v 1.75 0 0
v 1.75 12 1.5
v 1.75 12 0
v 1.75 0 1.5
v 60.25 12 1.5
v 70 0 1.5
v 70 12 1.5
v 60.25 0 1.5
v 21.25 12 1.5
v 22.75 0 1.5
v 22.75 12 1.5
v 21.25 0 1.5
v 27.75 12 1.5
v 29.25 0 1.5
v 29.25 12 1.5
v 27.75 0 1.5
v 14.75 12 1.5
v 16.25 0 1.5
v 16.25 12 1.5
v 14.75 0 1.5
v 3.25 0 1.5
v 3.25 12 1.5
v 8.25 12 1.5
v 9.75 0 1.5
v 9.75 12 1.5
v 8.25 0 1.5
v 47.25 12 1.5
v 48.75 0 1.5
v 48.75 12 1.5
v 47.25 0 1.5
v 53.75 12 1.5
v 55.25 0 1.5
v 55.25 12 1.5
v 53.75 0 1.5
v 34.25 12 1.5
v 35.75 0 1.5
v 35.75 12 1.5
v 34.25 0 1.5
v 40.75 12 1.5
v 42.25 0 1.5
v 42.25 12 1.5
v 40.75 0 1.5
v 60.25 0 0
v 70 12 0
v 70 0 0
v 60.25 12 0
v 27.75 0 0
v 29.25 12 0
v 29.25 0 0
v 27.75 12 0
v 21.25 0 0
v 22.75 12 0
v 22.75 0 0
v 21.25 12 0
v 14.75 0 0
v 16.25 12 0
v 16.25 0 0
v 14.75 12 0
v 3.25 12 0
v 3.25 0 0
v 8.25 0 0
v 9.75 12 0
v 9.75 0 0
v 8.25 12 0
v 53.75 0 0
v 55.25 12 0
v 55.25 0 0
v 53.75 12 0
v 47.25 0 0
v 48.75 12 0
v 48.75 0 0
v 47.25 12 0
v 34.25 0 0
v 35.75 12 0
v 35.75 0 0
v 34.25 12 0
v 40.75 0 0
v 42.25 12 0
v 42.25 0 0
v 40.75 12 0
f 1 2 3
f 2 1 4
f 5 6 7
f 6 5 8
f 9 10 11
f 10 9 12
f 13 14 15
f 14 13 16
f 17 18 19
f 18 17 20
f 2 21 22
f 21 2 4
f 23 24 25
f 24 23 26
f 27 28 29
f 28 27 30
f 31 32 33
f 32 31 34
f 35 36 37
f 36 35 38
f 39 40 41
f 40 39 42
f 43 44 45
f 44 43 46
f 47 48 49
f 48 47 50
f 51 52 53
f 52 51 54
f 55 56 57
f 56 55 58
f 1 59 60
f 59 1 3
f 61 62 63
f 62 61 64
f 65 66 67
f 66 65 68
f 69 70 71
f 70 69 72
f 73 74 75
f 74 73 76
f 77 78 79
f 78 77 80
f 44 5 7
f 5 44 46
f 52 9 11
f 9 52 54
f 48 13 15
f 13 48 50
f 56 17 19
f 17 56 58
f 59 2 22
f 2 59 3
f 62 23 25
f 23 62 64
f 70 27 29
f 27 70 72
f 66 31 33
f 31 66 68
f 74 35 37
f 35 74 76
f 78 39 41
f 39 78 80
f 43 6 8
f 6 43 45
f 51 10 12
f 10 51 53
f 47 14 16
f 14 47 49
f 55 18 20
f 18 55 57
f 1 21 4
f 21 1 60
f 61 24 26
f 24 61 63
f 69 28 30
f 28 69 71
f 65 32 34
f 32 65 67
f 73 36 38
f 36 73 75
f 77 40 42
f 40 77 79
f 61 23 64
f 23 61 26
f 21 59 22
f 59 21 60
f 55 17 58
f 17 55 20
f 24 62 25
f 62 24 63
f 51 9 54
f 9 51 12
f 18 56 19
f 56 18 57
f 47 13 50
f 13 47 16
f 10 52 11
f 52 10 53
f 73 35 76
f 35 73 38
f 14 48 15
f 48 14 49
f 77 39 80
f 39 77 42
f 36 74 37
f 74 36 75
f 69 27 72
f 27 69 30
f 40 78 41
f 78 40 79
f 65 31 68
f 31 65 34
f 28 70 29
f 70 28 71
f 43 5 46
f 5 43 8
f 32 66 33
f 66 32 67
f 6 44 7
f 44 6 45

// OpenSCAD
// 10-well agarose gel comb, printed lying flat
// Units: mm

$fn = 64;

// --- Plate ---
plate_len   = 70;   // spine length (X)
plate_wid   = 12;   // spine width (Y)
plate_thk   = 1.5;  // plate thickness (Z)

// --- Teeth ---
teeth_n     = 10;   // number of teeth
teeth_w     = 5.0;  // tooth width (X)
teeth_l     = 12;   // tooth length (Y)
teeth_gap   = 1.5;  // gap between teeth (X)
teeth_dir   = -1;   // hang direction along Y (+1 or -1)

// --- Derived ---
row_w      = (teeth_n - 1) * teeth_gap + teeth_n * teeth_w;  // row width in X
overhang   = teeth_l - plate_wid;                            // tooth overhangs end of spine
x0         = -plate_len / 2 + row_w / 2;                     // first tooth X (centred row)

difference() {
    // Plate (spine)
    translate([0, 0, 0])
        cube([plate_len, plate_wid, plate_thk]);

    // Teeth, cut into the plate
    for (i = [0 : teeth_n - 1]) {
        translate([x0 + i * (teeth_w + teeth_gap), 0, 0])
            cube([teeth_w, teeth_l, plate_thk]);
    }
}
